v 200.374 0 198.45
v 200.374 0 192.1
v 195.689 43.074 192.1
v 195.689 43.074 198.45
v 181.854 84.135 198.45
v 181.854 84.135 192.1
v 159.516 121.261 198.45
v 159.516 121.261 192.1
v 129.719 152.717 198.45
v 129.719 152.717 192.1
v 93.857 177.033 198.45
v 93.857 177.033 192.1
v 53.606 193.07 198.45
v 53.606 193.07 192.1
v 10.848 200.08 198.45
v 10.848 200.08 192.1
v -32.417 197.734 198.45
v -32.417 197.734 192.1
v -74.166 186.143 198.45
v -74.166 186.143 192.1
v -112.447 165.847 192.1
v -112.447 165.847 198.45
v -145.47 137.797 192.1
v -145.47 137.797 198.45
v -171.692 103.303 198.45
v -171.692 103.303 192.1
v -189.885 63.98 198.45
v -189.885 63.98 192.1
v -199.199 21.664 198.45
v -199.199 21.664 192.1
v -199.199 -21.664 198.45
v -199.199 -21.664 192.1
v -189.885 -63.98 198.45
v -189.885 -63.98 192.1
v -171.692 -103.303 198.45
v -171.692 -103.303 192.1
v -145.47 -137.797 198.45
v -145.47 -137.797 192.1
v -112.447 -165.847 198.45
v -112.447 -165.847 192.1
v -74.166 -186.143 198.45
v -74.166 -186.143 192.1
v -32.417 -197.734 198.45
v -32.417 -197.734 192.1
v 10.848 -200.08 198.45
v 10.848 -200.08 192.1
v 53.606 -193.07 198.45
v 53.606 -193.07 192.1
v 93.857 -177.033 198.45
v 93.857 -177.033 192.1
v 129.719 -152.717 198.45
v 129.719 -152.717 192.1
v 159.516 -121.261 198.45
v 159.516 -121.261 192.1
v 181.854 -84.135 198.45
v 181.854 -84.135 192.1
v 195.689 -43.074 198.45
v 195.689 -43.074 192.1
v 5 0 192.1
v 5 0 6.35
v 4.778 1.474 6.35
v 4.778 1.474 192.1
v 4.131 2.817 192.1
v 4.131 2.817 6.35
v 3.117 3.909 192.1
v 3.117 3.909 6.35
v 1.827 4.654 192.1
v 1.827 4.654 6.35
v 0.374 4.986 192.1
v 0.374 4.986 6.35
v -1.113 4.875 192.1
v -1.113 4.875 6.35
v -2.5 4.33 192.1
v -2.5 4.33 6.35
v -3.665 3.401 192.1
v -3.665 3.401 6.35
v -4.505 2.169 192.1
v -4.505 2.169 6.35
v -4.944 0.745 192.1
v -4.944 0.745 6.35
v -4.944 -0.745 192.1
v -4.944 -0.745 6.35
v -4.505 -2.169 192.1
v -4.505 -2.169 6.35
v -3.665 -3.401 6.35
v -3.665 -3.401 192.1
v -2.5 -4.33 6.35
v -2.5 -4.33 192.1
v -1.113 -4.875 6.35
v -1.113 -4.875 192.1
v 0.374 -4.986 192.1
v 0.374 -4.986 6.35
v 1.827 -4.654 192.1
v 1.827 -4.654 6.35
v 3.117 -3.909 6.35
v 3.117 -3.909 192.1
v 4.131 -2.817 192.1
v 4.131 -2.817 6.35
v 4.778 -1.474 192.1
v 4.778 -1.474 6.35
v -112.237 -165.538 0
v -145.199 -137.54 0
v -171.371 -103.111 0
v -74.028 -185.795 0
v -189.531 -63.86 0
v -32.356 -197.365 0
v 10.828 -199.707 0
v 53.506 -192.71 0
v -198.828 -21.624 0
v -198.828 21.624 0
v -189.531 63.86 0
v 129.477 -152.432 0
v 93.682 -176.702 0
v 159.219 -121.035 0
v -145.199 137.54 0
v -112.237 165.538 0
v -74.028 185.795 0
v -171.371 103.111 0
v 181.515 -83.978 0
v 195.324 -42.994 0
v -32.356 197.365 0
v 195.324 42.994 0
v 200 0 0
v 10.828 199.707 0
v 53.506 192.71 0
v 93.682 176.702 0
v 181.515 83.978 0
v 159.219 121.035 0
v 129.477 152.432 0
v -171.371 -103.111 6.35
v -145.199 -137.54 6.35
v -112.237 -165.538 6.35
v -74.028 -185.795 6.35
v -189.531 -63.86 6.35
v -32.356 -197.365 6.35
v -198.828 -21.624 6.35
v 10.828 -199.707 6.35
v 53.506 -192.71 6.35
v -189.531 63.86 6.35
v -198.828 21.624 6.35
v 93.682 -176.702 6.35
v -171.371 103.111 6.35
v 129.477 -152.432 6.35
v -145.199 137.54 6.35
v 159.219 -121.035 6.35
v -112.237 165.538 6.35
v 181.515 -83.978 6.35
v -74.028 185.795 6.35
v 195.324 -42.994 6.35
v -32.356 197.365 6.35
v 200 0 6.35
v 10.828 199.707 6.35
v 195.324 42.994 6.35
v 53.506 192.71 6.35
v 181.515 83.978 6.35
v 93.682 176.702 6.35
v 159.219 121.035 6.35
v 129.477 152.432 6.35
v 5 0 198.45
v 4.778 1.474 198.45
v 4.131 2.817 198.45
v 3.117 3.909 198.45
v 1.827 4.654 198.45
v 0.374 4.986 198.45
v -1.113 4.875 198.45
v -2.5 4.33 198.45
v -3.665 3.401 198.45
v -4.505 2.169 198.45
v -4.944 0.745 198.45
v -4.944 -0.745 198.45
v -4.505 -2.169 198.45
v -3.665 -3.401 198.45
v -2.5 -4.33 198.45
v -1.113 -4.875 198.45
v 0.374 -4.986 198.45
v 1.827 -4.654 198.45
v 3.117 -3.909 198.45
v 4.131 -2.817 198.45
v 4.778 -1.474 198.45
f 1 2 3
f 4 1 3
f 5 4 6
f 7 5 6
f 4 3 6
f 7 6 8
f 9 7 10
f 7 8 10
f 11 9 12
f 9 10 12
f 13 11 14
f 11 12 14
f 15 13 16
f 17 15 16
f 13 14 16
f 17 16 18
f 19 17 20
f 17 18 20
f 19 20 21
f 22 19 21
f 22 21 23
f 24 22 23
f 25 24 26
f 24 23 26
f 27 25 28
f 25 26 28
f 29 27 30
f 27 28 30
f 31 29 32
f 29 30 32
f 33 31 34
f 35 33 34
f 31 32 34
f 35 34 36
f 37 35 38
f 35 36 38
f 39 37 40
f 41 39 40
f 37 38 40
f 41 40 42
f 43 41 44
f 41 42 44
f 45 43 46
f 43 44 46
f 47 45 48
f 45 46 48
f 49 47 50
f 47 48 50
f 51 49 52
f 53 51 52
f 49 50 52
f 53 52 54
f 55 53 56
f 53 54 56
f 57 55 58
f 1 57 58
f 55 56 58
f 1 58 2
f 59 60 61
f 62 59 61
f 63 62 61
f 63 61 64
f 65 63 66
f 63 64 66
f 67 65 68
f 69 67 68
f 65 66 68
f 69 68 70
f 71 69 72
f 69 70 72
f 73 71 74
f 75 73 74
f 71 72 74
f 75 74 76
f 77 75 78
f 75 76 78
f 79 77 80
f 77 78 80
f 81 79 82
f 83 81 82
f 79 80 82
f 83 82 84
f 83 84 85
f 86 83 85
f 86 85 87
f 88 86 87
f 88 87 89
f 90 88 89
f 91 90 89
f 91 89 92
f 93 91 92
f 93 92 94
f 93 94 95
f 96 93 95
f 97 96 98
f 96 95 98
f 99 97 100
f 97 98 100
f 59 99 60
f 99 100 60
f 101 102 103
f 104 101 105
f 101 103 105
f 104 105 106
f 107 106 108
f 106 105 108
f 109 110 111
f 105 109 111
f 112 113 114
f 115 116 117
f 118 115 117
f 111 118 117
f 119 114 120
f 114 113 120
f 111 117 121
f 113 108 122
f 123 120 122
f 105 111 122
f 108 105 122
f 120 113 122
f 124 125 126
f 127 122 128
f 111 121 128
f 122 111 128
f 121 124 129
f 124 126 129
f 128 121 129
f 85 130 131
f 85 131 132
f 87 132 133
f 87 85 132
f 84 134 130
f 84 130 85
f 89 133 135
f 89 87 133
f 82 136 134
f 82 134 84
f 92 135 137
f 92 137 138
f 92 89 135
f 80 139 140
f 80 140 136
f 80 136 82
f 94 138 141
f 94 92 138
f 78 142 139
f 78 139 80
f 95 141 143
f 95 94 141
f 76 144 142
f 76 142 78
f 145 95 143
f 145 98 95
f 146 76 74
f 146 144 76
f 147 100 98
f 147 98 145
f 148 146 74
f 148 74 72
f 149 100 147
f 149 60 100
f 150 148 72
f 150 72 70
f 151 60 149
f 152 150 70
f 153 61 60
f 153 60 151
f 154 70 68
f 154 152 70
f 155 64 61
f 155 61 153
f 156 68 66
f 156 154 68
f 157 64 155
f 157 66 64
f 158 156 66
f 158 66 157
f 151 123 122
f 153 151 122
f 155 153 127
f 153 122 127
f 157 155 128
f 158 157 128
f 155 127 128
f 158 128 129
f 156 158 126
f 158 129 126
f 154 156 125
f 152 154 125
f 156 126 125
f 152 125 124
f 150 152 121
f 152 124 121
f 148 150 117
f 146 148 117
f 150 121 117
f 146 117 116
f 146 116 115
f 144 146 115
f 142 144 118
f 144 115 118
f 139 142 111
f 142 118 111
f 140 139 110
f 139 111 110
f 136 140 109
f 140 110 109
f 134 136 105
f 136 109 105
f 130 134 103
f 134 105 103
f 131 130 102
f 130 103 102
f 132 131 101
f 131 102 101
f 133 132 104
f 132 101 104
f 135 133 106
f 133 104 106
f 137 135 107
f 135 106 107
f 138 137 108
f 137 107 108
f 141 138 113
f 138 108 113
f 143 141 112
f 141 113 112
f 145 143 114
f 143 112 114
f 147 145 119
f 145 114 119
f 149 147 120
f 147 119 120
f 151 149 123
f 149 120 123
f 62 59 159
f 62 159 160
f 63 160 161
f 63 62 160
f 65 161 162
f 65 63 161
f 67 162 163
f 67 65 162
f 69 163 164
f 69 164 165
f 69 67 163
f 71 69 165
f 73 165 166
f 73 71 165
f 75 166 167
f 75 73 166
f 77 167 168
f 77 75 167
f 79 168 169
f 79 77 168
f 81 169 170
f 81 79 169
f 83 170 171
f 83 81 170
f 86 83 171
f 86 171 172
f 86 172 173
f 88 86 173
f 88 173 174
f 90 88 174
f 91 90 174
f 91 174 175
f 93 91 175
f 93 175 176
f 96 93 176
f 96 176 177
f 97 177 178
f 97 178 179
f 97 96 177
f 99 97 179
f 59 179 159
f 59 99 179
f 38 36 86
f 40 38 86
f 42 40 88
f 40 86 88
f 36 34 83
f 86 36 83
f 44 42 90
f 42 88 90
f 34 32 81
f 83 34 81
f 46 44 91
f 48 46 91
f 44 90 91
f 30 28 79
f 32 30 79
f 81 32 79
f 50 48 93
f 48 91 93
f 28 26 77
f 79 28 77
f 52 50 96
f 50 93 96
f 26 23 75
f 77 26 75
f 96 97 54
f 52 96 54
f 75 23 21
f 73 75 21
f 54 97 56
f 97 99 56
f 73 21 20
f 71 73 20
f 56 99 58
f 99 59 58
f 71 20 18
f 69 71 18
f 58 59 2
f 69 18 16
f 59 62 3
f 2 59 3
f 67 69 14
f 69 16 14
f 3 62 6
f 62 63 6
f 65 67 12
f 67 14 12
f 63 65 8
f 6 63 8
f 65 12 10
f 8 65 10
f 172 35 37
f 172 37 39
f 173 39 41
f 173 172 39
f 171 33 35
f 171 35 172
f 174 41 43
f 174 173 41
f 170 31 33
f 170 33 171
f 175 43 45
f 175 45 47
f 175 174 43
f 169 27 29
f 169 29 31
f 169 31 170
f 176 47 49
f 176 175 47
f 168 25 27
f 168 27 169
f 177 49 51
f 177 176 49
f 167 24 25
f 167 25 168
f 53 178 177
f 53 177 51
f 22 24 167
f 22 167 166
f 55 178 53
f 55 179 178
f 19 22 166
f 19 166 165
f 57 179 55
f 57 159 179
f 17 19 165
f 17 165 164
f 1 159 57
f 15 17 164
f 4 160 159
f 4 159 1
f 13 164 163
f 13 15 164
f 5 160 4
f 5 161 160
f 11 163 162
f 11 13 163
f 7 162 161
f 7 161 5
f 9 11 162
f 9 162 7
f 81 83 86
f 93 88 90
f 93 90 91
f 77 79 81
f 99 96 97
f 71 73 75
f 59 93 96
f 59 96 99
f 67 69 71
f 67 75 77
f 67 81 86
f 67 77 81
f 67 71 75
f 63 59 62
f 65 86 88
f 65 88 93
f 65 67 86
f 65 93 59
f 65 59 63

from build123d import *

# Parameters (mm, degrees)
F0_R     = 200
F1_DEPTH = 6.35
F2_R     = 5
F3_DEPTH = 185.7502
F4_R     = 200.3737721093
F4_R_2   = 5
F5_DEPTH = 6.35


# Not quite as in the source:
# - a length typed as a fraction of an inch, garbled in the dataset ("3 / 203.2 mm" for 3/8 in), is restored


with BuildPart() as f1:
    # F0 (on Top) → F1 (new body)
    with BuildSketch(Plane.XY):
        Circle(F0_R)
    extrude(amount=F1_DEPTH)

    # F2 (on face) → F3 (join)
    with BuildSketch(Plane.XY.offset(6.35)):
        Circle(F2_R)
    extrude(amount=F3_DEPTH)


with BuildPart() as f5:
    # F4 (on face) → F5 (new body)
    with BuildSketch(Plane.XY.offset(192.1002)):
        Circle(F4_R)
        Circle(F4_R_2, mode=Mode.SUBTRACT)
    extrude(amount=F5_DEPTH)


solid = Compound([f1.part, f5.part])
